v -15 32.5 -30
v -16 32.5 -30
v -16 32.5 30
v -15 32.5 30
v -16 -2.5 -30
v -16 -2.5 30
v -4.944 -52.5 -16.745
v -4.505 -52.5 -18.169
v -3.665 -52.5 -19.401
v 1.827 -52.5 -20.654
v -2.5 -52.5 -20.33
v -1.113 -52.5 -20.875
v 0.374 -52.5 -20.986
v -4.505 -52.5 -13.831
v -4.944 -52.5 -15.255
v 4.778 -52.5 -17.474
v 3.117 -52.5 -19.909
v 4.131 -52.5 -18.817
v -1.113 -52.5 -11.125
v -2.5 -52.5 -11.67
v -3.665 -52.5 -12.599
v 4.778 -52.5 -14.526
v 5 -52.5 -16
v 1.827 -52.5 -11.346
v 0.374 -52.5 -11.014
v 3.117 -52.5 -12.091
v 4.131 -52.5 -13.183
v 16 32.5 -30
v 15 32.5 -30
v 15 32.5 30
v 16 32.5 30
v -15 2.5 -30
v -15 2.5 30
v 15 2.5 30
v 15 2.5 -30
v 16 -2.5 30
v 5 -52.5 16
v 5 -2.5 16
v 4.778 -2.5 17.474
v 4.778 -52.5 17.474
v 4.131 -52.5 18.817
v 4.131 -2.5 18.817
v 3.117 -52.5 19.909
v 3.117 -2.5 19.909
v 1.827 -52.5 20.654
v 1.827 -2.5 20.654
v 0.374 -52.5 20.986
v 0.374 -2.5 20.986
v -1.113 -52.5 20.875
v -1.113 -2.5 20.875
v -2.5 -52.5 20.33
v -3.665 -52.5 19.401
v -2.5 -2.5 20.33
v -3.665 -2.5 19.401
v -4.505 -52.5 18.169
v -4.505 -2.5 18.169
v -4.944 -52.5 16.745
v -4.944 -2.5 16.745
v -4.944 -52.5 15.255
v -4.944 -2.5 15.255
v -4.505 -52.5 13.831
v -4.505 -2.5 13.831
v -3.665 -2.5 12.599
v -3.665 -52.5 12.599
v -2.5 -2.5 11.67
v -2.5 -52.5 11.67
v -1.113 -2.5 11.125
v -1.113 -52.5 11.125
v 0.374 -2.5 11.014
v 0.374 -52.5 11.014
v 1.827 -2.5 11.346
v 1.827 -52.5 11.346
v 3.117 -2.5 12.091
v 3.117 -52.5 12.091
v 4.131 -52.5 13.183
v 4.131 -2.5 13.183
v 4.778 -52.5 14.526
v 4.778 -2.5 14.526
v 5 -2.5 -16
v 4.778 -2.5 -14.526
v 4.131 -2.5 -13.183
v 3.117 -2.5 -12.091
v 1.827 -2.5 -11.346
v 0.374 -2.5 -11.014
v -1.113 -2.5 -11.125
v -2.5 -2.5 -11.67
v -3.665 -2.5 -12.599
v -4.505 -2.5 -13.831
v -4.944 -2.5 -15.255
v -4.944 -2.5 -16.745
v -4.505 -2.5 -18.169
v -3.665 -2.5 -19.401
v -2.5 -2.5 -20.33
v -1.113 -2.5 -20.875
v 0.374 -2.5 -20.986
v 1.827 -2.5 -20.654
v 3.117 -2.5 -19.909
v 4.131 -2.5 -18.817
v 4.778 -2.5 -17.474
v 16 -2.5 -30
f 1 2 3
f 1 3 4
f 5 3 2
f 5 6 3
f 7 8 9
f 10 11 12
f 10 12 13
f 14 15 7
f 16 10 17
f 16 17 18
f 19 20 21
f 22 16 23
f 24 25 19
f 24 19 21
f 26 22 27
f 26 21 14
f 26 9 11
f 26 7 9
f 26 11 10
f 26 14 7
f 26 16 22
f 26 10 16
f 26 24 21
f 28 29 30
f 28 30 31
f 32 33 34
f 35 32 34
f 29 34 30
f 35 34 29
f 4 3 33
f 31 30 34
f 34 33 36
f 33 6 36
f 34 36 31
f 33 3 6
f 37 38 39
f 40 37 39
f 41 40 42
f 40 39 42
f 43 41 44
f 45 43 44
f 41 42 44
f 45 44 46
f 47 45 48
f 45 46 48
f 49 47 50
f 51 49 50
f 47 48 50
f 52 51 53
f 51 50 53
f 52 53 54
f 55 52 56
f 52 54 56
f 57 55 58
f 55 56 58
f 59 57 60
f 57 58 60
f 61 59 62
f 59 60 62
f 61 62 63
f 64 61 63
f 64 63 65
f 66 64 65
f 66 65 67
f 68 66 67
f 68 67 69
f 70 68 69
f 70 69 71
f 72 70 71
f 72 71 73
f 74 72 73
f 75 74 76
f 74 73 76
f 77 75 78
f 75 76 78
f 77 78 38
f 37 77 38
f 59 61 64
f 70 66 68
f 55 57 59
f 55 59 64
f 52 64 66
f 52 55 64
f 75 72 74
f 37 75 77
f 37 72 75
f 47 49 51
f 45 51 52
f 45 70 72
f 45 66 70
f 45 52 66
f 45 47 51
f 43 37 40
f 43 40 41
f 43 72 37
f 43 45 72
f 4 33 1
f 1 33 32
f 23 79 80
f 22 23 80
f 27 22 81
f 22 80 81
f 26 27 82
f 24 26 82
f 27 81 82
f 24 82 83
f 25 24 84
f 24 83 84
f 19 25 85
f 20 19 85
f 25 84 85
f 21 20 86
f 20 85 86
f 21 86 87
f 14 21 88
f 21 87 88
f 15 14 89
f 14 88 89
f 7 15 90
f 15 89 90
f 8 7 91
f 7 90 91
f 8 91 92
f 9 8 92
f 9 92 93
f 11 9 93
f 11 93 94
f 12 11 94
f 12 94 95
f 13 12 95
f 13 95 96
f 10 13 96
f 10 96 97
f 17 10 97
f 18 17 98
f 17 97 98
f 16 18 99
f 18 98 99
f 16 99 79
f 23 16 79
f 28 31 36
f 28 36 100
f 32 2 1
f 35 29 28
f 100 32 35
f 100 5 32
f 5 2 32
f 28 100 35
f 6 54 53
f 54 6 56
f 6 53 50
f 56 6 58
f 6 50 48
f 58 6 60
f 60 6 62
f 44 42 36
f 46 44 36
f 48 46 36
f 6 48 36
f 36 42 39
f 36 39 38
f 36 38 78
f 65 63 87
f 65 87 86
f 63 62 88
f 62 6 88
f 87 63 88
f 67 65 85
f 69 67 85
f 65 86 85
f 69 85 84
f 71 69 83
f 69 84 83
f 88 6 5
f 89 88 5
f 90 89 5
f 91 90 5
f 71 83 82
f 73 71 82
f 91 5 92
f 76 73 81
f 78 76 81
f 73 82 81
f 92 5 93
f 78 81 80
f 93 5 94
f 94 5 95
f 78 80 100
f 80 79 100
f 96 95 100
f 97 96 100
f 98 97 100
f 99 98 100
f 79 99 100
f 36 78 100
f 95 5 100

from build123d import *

# Parameters (mm, degrees)
SKETCH1_W           = 32
SKETCH1_H           = 60
BOSS_EXTRUDE1_DEPTH = 2.5
SKETCH2_R           = 5
BOSS_EXTRUDE2_DEPTH = 50
SKETCH3_W           = 1
SKETCH3_H           = 60
BOSS_EXTRUDE3_DEPTH = 30


with BuildPart() as part:
    # Sketch1 → Boss-Extrude1 (new body, symmetric)
    with BuildSketch(Plane(origin=(0, 0, 0), x_dir=(1, 0, 0), z_dir=(0, 1, 0))):
        Rectangle(SKETCH1_W, SKETCH1_H)
    extrude(amount=BOSS_EXTRUDE1_DEPTH, both=True)

    # Sketch2 → Boss-Extrude2 (add)
    with BuildSketch(Plane.XZ.offset(2.5)):
        with Locations((0, 16)):
            Circle(SKETCH2_R)
        with Locations((0, -16)):
            Circle(SKETCH2_R)
    extrude(amount=BOSS_EXTRUDE2_DEPTH)

    # Sketch3 → Boss-Extrude3 (add)
    with BuildSketch(Plane(origin=(0, 2.5, 0), x_dir=(1, 0, 0), z_dir=(0, 1, 0))):
        with Locations((-15.5, 0)):
            Rectangle(SKETCH3_W, SKETCH3_H)
        with Locations((15.5, 0)):
            Rectangle(SKETCH3_W, SKETCH3_H)
    extrude(amount=BOSS_EXTRUDE3_DEPTH)


solid = part.part
